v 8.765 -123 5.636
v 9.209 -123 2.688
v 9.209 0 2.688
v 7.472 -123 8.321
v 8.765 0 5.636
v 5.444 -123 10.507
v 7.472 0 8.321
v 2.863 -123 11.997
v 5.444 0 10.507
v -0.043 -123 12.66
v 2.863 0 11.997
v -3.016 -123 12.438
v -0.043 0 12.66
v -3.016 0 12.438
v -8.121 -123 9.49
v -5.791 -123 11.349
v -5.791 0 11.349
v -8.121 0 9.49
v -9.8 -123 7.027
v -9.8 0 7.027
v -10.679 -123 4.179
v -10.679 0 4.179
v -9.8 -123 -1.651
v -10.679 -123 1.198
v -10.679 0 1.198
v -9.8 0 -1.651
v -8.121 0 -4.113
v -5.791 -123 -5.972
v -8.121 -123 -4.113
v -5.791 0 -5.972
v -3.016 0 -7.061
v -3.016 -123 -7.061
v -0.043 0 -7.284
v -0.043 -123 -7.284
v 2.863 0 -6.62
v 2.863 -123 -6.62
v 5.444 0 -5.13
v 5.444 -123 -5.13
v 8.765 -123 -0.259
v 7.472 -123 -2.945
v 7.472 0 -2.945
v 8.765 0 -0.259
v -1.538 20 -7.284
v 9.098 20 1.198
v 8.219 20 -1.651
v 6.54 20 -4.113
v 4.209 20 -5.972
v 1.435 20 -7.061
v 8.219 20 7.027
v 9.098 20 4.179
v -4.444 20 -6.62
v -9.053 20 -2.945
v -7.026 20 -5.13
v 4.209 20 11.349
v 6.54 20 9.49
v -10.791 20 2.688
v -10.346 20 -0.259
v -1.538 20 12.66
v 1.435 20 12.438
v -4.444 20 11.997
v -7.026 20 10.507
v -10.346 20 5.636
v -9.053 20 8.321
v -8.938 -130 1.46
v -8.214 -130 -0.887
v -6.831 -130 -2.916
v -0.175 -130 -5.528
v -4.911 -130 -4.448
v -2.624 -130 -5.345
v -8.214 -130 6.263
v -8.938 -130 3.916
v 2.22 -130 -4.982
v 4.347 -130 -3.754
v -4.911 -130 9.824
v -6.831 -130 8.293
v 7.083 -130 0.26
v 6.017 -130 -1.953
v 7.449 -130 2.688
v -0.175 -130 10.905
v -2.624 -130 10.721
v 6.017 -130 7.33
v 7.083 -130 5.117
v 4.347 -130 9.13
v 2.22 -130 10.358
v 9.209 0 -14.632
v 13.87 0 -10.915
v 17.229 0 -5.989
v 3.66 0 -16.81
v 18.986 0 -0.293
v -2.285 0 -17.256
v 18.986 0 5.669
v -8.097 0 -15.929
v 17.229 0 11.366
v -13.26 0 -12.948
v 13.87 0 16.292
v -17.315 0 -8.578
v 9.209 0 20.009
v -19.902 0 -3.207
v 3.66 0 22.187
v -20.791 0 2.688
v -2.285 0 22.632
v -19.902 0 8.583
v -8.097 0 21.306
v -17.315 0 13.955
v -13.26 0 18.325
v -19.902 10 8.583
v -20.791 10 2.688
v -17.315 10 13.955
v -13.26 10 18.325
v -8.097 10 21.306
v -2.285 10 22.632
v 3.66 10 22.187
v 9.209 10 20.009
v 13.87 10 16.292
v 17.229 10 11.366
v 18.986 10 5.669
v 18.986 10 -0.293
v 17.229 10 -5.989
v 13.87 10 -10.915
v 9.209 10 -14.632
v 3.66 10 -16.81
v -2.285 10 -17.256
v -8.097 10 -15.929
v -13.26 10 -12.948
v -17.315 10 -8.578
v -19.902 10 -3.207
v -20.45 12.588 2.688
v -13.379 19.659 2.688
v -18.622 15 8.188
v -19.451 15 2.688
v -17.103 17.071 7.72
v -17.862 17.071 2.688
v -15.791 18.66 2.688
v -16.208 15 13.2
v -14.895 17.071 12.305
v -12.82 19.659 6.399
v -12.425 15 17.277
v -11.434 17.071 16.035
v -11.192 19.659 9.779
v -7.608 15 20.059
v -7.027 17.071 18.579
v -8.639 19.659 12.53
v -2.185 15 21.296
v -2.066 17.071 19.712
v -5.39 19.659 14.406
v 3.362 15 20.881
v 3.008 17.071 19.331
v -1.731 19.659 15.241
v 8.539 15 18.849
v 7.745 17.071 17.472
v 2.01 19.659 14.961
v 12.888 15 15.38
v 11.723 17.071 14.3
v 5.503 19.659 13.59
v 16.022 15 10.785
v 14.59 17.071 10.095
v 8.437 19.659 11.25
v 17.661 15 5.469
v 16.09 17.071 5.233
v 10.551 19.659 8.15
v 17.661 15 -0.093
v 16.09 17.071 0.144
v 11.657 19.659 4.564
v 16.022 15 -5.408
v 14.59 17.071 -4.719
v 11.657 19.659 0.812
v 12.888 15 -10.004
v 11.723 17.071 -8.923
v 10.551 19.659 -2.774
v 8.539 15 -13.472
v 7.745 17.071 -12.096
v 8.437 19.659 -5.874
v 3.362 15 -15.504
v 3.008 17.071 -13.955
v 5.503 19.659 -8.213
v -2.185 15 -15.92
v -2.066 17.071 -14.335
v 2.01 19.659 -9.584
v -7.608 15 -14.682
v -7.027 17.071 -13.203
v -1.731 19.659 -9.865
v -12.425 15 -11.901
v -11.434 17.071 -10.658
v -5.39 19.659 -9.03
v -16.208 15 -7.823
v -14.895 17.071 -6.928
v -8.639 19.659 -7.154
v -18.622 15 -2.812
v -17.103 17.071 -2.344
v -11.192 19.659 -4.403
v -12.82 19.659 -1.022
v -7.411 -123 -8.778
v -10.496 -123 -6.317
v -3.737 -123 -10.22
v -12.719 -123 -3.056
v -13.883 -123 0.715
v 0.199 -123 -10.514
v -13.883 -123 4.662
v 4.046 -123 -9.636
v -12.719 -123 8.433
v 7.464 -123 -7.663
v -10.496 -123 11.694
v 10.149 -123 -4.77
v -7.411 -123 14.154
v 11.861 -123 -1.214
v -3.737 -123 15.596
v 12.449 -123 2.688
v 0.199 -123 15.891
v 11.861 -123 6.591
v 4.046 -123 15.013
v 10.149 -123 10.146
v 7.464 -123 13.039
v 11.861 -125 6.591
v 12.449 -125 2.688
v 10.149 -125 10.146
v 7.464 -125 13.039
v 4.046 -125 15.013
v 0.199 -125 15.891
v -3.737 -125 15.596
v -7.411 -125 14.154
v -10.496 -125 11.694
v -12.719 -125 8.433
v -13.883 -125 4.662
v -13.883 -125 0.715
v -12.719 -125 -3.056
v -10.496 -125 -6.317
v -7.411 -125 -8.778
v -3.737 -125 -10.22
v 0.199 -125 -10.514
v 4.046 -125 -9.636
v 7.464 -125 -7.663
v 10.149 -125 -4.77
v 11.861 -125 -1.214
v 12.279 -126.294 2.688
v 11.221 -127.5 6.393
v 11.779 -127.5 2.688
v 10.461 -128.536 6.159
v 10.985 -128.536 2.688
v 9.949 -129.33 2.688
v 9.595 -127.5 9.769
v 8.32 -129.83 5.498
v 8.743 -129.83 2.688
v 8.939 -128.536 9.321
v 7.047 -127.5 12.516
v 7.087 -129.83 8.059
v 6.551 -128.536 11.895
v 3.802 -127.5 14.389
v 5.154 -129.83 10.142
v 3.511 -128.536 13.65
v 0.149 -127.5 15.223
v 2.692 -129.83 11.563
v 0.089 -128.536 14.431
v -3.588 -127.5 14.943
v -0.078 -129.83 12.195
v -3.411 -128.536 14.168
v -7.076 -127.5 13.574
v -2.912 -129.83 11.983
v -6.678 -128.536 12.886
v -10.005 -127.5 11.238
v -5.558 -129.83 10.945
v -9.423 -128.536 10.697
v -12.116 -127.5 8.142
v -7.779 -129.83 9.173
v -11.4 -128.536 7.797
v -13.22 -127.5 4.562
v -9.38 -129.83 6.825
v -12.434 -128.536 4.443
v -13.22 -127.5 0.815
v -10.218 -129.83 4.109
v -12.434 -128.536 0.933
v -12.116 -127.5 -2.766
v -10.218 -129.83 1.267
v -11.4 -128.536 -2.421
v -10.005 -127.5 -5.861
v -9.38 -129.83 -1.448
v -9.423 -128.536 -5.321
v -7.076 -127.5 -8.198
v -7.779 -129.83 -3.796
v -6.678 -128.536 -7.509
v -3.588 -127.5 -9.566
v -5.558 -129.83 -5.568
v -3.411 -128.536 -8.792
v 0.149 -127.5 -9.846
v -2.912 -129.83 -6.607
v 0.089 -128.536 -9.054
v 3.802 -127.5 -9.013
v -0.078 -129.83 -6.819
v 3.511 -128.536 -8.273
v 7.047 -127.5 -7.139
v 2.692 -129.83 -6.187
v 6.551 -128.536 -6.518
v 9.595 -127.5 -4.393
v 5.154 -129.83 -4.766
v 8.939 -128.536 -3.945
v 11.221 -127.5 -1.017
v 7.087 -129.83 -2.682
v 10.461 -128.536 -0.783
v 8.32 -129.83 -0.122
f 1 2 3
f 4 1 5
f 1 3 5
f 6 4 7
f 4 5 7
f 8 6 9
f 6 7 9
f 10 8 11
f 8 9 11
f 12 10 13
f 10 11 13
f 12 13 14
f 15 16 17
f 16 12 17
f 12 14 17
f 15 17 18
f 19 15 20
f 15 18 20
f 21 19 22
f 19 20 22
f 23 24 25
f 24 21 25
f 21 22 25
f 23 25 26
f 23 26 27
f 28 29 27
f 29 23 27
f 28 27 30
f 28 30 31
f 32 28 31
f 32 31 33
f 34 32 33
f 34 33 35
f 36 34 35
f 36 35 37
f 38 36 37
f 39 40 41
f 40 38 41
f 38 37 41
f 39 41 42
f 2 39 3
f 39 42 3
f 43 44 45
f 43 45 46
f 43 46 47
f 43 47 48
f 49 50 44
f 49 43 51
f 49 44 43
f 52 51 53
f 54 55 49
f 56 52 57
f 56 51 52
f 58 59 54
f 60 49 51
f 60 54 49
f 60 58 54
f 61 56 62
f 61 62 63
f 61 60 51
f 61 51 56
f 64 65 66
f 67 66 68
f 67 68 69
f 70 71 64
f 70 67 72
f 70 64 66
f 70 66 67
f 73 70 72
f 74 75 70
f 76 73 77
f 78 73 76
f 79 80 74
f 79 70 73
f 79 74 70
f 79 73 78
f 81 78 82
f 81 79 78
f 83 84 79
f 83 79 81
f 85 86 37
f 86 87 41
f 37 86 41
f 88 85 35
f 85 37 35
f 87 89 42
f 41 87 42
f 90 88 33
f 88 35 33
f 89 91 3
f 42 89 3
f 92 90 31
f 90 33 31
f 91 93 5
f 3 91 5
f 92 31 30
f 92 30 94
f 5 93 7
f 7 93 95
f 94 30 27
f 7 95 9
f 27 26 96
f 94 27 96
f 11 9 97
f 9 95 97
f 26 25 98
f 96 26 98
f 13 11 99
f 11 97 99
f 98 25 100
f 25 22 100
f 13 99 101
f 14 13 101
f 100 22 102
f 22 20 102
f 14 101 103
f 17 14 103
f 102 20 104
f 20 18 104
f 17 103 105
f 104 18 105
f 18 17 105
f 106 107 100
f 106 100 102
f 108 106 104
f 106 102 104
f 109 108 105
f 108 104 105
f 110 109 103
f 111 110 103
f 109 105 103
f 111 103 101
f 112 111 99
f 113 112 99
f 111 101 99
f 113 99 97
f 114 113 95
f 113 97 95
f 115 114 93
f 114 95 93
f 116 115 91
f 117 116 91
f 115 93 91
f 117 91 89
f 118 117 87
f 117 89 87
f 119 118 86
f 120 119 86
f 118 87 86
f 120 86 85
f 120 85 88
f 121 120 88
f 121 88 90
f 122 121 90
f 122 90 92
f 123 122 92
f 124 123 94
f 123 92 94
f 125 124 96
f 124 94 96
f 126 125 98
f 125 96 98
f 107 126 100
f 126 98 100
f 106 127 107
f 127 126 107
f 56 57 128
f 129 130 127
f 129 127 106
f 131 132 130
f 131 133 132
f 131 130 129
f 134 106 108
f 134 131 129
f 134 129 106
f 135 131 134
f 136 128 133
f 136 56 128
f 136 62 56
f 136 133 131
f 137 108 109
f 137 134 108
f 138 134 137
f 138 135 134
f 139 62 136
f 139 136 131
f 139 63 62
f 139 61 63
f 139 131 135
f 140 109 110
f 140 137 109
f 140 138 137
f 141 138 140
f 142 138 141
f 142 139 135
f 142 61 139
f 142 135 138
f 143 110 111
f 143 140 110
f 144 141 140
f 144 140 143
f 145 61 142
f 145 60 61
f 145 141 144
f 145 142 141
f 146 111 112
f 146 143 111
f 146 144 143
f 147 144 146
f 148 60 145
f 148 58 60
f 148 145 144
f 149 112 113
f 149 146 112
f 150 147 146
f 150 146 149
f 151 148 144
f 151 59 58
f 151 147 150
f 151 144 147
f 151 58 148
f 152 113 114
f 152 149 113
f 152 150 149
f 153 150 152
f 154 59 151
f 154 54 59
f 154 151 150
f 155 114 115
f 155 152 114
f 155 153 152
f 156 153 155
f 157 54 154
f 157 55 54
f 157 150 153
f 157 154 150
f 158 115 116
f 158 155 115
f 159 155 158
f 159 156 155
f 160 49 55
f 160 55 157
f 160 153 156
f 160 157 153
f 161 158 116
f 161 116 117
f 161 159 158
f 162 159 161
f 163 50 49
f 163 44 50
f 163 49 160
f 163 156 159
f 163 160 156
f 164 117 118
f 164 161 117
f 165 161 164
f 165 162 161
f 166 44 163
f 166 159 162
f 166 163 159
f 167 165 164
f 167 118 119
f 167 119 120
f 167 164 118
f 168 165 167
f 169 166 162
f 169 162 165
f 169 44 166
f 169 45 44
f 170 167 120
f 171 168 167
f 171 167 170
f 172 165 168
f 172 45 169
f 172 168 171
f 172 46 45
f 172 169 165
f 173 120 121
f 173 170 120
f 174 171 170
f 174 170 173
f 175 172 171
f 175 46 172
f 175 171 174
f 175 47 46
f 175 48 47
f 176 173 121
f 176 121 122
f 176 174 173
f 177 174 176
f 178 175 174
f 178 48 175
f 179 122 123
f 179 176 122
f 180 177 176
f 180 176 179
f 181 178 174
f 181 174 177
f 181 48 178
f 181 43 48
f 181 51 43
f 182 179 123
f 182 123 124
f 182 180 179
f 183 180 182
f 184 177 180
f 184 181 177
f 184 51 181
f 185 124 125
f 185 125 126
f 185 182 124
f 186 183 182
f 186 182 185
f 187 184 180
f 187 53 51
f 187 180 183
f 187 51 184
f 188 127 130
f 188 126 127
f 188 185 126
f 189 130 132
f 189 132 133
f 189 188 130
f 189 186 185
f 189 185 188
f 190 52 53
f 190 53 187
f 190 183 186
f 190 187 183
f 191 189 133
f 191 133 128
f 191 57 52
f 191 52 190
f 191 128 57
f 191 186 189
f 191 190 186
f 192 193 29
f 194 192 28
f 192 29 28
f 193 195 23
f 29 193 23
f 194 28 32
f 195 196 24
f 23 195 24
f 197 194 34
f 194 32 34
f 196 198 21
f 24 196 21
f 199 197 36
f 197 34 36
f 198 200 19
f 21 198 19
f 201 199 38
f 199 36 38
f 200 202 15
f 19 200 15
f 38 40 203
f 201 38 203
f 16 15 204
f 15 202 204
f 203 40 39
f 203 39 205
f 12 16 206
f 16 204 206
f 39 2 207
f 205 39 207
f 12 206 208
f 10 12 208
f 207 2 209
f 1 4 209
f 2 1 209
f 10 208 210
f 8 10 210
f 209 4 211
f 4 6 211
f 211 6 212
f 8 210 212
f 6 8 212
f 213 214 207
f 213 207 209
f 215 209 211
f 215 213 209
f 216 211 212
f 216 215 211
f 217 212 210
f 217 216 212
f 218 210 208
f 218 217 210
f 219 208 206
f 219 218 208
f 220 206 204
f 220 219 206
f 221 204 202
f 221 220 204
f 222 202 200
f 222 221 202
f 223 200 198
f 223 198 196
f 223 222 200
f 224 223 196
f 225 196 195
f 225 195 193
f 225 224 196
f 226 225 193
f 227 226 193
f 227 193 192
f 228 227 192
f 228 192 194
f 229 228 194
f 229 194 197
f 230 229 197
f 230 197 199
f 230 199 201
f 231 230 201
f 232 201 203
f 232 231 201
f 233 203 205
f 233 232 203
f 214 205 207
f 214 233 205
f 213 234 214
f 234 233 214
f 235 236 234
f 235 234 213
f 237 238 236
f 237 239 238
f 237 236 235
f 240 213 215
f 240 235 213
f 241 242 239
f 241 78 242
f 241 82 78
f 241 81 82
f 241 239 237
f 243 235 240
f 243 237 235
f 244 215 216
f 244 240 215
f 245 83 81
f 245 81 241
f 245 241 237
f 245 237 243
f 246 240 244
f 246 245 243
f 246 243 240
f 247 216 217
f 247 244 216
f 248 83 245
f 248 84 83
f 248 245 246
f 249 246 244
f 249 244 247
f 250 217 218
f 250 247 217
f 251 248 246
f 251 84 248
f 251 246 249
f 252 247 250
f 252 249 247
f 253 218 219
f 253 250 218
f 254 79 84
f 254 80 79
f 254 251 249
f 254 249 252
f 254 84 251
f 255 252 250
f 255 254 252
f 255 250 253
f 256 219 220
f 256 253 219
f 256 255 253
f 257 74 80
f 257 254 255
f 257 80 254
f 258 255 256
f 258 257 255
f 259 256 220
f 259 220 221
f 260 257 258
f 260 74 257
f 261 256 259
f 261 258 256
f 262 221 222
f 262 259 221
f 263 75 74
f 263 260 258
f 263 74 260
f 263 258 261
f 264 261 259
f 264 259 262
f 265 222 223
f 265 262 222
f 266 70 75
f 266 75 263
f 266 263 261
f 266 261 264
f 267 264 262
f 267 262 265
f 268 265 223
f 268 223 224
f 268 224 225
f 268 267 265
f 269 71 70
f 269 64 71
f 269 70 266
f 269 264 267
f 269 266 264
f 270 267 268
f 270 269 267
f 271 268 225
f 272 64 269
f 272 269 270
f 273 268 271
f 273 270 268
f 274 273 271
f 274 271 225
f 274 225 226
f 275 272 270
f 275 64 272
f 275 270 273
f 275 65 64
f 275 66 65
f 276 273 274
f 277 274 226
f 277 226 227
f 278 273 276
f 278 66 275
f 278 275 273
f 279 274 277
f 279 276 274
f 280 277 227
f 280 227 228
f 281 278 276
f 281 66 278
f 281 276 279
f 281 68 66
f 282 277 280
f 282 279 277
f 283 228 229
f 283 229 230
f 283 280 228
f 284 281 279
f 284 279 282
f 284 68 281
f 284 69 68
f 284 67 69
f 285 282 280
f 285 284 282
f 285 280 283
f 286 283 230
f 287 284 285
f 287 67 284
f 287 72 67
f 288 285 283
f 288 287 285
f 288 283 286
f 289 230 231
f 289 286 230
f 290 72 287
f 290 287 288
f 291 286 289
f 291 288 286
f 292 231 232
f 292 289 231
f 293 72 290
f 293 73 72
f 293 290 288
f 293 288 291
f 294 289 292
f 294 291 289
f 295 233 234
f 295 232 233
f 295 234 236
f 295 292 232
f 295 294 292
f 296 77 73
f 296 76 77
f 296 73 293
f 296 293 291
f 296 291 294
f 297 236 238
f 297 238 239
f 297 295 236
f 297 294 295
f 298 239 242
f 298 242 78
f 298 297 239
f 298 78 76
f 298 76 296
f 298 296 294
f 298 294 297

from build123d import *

# Parameters (mm, degrees)
F0_R     = 10
F1_DEPTH = 130
F2_R     = 20
F3_DEPTH = 20
F4_R     = 10
F5_R     = 13.239719
F6_DEPTH = 7
F7_R     = 5


with BuildPart() as f1:
    # F0 (on Front) → F1 (new body)
    with BuildSketch(Plane.XZ):
        with Locations((-0.790664, 2.688253)):
            Circle(F0_R)
    extrude(amount=F1_DEPTH)

    # F2 (on face) → F3 (join)
    with BuildSketch(Plane(origin=(0, 0, 0), x_dir=(-1, 0, 0), z_dir=(0, 1, 0))):
        with Locations((0.790664, 2.688253)):
            Circle(F2_R)
    extrude(amount=F3_DEPTH)

    # F4
    f4_edges = [f1.edges().sort_by_distance(p)[0] for p in [
        (19.209336, 20, 2.688253),
    ]]
    fillet(f4_edges, radius=F4_R)

    # F5 (on face) → F6 (join)
    with BuildSketch(Plane.XZ.offset(130)):
        with Locations((-0.790664, 2.688253)):
            Circle(F5_R)
    extrude(amount=-F6_DEPTH)

    # F7
    f7_edges = [f1.edges().sort_by_distance(p)[0] for p in [
        (-14.030383, -130, 2.688253),
    ]]
    fillet(f7_edges, radius=F7_R)


solid = f1.part
